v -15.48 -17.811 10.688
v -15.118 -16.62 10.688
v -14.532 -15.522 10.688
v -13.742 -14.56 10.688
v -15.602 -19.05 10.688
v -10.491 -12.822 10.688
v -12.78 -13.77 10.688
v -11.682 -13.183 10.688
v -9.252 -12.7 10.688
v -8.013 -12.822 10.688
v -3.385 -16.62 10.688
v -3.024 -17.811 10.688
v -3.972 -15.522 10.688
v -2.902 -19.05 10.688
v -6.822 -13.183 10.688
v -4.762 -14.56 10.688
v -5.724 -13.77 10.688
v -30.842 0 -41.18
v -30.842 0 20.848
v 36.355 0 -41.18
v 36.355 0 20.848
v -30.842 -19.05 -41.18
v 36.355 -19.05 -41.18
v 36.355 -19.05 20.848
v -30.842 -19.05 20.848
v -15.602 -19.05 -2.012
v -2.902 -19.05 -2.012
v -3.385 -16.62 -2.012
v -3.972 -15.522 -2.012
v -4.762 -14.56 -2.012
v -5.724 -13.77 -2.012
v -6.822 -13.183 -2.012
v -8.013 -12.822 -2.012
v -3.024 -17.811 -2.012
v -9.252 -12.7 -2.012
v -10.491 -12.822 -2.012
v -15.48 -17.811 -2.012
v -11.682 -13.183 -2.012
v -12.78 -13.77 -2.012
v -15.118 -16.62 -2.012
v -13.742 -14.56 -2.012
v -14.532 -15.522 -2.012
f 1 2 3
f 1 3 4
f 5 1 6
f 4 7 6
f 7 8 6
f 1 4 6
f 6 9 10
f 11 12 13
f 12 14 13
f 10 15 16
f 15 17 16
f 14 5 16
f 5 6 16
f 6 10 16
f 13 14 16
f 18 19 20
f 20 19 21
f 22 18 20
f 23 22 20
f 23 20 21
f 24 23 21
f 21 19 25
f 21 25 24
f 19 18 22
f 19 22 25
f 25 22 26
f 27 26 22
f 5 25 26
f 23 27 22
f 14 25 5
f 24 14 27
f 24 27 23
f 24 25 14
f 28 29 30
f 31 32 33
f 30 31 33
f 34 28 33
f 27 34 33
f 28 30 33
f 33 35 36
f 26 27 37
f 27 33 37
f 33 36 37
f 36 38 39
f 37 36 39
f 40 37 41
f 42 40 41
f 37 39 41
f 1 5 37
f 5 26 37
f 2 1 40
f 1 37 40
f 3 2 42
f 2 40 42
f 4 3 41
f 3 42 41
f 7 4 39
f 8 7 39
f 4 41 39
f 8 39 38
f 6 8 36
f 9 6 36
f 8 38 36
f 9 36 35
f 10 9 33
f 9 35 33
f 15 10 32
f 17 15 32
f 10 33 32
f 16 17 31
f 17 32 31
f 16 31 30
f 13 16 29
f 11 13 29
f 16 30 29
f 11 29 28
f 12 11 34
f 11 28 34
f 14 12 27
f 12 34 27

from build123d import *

# Parameters (mm, degrees)
F2_W     = 67.197241
F2_H     = 62.02823
F0_DEPTH = 19.05
F3_ANGLE = -180


with BuildPart() as f0:
    # F2 (on Front) → F0 (new body)
    with BuildSketch(Plane.XZ):
        with Locations((2.756816, -10.165736)):
            Rectangle(F2_W, F2_H)
    extrude(amount=F0_DEPTH)

    # F1 (on face) → F3 (revolve, cut)
    with BuildSketch(Plane.XZ.offset(19.05)):
        Polygon((-15.601805, -2.011621), (-9.251805, -2.011621), (-9.251805, 10.688379), (-12.426805, 10.688379), (-15.601805, 10.688379), (-15.601805, 8.631975), align=None)
    revolve(axis=Axis((-9.251805, -19.05, 4.338379), (0, 0, 1)), revolution_arc=F3_ANGLE, mode=Mode.SUBTRACT)


solid = f0.part
